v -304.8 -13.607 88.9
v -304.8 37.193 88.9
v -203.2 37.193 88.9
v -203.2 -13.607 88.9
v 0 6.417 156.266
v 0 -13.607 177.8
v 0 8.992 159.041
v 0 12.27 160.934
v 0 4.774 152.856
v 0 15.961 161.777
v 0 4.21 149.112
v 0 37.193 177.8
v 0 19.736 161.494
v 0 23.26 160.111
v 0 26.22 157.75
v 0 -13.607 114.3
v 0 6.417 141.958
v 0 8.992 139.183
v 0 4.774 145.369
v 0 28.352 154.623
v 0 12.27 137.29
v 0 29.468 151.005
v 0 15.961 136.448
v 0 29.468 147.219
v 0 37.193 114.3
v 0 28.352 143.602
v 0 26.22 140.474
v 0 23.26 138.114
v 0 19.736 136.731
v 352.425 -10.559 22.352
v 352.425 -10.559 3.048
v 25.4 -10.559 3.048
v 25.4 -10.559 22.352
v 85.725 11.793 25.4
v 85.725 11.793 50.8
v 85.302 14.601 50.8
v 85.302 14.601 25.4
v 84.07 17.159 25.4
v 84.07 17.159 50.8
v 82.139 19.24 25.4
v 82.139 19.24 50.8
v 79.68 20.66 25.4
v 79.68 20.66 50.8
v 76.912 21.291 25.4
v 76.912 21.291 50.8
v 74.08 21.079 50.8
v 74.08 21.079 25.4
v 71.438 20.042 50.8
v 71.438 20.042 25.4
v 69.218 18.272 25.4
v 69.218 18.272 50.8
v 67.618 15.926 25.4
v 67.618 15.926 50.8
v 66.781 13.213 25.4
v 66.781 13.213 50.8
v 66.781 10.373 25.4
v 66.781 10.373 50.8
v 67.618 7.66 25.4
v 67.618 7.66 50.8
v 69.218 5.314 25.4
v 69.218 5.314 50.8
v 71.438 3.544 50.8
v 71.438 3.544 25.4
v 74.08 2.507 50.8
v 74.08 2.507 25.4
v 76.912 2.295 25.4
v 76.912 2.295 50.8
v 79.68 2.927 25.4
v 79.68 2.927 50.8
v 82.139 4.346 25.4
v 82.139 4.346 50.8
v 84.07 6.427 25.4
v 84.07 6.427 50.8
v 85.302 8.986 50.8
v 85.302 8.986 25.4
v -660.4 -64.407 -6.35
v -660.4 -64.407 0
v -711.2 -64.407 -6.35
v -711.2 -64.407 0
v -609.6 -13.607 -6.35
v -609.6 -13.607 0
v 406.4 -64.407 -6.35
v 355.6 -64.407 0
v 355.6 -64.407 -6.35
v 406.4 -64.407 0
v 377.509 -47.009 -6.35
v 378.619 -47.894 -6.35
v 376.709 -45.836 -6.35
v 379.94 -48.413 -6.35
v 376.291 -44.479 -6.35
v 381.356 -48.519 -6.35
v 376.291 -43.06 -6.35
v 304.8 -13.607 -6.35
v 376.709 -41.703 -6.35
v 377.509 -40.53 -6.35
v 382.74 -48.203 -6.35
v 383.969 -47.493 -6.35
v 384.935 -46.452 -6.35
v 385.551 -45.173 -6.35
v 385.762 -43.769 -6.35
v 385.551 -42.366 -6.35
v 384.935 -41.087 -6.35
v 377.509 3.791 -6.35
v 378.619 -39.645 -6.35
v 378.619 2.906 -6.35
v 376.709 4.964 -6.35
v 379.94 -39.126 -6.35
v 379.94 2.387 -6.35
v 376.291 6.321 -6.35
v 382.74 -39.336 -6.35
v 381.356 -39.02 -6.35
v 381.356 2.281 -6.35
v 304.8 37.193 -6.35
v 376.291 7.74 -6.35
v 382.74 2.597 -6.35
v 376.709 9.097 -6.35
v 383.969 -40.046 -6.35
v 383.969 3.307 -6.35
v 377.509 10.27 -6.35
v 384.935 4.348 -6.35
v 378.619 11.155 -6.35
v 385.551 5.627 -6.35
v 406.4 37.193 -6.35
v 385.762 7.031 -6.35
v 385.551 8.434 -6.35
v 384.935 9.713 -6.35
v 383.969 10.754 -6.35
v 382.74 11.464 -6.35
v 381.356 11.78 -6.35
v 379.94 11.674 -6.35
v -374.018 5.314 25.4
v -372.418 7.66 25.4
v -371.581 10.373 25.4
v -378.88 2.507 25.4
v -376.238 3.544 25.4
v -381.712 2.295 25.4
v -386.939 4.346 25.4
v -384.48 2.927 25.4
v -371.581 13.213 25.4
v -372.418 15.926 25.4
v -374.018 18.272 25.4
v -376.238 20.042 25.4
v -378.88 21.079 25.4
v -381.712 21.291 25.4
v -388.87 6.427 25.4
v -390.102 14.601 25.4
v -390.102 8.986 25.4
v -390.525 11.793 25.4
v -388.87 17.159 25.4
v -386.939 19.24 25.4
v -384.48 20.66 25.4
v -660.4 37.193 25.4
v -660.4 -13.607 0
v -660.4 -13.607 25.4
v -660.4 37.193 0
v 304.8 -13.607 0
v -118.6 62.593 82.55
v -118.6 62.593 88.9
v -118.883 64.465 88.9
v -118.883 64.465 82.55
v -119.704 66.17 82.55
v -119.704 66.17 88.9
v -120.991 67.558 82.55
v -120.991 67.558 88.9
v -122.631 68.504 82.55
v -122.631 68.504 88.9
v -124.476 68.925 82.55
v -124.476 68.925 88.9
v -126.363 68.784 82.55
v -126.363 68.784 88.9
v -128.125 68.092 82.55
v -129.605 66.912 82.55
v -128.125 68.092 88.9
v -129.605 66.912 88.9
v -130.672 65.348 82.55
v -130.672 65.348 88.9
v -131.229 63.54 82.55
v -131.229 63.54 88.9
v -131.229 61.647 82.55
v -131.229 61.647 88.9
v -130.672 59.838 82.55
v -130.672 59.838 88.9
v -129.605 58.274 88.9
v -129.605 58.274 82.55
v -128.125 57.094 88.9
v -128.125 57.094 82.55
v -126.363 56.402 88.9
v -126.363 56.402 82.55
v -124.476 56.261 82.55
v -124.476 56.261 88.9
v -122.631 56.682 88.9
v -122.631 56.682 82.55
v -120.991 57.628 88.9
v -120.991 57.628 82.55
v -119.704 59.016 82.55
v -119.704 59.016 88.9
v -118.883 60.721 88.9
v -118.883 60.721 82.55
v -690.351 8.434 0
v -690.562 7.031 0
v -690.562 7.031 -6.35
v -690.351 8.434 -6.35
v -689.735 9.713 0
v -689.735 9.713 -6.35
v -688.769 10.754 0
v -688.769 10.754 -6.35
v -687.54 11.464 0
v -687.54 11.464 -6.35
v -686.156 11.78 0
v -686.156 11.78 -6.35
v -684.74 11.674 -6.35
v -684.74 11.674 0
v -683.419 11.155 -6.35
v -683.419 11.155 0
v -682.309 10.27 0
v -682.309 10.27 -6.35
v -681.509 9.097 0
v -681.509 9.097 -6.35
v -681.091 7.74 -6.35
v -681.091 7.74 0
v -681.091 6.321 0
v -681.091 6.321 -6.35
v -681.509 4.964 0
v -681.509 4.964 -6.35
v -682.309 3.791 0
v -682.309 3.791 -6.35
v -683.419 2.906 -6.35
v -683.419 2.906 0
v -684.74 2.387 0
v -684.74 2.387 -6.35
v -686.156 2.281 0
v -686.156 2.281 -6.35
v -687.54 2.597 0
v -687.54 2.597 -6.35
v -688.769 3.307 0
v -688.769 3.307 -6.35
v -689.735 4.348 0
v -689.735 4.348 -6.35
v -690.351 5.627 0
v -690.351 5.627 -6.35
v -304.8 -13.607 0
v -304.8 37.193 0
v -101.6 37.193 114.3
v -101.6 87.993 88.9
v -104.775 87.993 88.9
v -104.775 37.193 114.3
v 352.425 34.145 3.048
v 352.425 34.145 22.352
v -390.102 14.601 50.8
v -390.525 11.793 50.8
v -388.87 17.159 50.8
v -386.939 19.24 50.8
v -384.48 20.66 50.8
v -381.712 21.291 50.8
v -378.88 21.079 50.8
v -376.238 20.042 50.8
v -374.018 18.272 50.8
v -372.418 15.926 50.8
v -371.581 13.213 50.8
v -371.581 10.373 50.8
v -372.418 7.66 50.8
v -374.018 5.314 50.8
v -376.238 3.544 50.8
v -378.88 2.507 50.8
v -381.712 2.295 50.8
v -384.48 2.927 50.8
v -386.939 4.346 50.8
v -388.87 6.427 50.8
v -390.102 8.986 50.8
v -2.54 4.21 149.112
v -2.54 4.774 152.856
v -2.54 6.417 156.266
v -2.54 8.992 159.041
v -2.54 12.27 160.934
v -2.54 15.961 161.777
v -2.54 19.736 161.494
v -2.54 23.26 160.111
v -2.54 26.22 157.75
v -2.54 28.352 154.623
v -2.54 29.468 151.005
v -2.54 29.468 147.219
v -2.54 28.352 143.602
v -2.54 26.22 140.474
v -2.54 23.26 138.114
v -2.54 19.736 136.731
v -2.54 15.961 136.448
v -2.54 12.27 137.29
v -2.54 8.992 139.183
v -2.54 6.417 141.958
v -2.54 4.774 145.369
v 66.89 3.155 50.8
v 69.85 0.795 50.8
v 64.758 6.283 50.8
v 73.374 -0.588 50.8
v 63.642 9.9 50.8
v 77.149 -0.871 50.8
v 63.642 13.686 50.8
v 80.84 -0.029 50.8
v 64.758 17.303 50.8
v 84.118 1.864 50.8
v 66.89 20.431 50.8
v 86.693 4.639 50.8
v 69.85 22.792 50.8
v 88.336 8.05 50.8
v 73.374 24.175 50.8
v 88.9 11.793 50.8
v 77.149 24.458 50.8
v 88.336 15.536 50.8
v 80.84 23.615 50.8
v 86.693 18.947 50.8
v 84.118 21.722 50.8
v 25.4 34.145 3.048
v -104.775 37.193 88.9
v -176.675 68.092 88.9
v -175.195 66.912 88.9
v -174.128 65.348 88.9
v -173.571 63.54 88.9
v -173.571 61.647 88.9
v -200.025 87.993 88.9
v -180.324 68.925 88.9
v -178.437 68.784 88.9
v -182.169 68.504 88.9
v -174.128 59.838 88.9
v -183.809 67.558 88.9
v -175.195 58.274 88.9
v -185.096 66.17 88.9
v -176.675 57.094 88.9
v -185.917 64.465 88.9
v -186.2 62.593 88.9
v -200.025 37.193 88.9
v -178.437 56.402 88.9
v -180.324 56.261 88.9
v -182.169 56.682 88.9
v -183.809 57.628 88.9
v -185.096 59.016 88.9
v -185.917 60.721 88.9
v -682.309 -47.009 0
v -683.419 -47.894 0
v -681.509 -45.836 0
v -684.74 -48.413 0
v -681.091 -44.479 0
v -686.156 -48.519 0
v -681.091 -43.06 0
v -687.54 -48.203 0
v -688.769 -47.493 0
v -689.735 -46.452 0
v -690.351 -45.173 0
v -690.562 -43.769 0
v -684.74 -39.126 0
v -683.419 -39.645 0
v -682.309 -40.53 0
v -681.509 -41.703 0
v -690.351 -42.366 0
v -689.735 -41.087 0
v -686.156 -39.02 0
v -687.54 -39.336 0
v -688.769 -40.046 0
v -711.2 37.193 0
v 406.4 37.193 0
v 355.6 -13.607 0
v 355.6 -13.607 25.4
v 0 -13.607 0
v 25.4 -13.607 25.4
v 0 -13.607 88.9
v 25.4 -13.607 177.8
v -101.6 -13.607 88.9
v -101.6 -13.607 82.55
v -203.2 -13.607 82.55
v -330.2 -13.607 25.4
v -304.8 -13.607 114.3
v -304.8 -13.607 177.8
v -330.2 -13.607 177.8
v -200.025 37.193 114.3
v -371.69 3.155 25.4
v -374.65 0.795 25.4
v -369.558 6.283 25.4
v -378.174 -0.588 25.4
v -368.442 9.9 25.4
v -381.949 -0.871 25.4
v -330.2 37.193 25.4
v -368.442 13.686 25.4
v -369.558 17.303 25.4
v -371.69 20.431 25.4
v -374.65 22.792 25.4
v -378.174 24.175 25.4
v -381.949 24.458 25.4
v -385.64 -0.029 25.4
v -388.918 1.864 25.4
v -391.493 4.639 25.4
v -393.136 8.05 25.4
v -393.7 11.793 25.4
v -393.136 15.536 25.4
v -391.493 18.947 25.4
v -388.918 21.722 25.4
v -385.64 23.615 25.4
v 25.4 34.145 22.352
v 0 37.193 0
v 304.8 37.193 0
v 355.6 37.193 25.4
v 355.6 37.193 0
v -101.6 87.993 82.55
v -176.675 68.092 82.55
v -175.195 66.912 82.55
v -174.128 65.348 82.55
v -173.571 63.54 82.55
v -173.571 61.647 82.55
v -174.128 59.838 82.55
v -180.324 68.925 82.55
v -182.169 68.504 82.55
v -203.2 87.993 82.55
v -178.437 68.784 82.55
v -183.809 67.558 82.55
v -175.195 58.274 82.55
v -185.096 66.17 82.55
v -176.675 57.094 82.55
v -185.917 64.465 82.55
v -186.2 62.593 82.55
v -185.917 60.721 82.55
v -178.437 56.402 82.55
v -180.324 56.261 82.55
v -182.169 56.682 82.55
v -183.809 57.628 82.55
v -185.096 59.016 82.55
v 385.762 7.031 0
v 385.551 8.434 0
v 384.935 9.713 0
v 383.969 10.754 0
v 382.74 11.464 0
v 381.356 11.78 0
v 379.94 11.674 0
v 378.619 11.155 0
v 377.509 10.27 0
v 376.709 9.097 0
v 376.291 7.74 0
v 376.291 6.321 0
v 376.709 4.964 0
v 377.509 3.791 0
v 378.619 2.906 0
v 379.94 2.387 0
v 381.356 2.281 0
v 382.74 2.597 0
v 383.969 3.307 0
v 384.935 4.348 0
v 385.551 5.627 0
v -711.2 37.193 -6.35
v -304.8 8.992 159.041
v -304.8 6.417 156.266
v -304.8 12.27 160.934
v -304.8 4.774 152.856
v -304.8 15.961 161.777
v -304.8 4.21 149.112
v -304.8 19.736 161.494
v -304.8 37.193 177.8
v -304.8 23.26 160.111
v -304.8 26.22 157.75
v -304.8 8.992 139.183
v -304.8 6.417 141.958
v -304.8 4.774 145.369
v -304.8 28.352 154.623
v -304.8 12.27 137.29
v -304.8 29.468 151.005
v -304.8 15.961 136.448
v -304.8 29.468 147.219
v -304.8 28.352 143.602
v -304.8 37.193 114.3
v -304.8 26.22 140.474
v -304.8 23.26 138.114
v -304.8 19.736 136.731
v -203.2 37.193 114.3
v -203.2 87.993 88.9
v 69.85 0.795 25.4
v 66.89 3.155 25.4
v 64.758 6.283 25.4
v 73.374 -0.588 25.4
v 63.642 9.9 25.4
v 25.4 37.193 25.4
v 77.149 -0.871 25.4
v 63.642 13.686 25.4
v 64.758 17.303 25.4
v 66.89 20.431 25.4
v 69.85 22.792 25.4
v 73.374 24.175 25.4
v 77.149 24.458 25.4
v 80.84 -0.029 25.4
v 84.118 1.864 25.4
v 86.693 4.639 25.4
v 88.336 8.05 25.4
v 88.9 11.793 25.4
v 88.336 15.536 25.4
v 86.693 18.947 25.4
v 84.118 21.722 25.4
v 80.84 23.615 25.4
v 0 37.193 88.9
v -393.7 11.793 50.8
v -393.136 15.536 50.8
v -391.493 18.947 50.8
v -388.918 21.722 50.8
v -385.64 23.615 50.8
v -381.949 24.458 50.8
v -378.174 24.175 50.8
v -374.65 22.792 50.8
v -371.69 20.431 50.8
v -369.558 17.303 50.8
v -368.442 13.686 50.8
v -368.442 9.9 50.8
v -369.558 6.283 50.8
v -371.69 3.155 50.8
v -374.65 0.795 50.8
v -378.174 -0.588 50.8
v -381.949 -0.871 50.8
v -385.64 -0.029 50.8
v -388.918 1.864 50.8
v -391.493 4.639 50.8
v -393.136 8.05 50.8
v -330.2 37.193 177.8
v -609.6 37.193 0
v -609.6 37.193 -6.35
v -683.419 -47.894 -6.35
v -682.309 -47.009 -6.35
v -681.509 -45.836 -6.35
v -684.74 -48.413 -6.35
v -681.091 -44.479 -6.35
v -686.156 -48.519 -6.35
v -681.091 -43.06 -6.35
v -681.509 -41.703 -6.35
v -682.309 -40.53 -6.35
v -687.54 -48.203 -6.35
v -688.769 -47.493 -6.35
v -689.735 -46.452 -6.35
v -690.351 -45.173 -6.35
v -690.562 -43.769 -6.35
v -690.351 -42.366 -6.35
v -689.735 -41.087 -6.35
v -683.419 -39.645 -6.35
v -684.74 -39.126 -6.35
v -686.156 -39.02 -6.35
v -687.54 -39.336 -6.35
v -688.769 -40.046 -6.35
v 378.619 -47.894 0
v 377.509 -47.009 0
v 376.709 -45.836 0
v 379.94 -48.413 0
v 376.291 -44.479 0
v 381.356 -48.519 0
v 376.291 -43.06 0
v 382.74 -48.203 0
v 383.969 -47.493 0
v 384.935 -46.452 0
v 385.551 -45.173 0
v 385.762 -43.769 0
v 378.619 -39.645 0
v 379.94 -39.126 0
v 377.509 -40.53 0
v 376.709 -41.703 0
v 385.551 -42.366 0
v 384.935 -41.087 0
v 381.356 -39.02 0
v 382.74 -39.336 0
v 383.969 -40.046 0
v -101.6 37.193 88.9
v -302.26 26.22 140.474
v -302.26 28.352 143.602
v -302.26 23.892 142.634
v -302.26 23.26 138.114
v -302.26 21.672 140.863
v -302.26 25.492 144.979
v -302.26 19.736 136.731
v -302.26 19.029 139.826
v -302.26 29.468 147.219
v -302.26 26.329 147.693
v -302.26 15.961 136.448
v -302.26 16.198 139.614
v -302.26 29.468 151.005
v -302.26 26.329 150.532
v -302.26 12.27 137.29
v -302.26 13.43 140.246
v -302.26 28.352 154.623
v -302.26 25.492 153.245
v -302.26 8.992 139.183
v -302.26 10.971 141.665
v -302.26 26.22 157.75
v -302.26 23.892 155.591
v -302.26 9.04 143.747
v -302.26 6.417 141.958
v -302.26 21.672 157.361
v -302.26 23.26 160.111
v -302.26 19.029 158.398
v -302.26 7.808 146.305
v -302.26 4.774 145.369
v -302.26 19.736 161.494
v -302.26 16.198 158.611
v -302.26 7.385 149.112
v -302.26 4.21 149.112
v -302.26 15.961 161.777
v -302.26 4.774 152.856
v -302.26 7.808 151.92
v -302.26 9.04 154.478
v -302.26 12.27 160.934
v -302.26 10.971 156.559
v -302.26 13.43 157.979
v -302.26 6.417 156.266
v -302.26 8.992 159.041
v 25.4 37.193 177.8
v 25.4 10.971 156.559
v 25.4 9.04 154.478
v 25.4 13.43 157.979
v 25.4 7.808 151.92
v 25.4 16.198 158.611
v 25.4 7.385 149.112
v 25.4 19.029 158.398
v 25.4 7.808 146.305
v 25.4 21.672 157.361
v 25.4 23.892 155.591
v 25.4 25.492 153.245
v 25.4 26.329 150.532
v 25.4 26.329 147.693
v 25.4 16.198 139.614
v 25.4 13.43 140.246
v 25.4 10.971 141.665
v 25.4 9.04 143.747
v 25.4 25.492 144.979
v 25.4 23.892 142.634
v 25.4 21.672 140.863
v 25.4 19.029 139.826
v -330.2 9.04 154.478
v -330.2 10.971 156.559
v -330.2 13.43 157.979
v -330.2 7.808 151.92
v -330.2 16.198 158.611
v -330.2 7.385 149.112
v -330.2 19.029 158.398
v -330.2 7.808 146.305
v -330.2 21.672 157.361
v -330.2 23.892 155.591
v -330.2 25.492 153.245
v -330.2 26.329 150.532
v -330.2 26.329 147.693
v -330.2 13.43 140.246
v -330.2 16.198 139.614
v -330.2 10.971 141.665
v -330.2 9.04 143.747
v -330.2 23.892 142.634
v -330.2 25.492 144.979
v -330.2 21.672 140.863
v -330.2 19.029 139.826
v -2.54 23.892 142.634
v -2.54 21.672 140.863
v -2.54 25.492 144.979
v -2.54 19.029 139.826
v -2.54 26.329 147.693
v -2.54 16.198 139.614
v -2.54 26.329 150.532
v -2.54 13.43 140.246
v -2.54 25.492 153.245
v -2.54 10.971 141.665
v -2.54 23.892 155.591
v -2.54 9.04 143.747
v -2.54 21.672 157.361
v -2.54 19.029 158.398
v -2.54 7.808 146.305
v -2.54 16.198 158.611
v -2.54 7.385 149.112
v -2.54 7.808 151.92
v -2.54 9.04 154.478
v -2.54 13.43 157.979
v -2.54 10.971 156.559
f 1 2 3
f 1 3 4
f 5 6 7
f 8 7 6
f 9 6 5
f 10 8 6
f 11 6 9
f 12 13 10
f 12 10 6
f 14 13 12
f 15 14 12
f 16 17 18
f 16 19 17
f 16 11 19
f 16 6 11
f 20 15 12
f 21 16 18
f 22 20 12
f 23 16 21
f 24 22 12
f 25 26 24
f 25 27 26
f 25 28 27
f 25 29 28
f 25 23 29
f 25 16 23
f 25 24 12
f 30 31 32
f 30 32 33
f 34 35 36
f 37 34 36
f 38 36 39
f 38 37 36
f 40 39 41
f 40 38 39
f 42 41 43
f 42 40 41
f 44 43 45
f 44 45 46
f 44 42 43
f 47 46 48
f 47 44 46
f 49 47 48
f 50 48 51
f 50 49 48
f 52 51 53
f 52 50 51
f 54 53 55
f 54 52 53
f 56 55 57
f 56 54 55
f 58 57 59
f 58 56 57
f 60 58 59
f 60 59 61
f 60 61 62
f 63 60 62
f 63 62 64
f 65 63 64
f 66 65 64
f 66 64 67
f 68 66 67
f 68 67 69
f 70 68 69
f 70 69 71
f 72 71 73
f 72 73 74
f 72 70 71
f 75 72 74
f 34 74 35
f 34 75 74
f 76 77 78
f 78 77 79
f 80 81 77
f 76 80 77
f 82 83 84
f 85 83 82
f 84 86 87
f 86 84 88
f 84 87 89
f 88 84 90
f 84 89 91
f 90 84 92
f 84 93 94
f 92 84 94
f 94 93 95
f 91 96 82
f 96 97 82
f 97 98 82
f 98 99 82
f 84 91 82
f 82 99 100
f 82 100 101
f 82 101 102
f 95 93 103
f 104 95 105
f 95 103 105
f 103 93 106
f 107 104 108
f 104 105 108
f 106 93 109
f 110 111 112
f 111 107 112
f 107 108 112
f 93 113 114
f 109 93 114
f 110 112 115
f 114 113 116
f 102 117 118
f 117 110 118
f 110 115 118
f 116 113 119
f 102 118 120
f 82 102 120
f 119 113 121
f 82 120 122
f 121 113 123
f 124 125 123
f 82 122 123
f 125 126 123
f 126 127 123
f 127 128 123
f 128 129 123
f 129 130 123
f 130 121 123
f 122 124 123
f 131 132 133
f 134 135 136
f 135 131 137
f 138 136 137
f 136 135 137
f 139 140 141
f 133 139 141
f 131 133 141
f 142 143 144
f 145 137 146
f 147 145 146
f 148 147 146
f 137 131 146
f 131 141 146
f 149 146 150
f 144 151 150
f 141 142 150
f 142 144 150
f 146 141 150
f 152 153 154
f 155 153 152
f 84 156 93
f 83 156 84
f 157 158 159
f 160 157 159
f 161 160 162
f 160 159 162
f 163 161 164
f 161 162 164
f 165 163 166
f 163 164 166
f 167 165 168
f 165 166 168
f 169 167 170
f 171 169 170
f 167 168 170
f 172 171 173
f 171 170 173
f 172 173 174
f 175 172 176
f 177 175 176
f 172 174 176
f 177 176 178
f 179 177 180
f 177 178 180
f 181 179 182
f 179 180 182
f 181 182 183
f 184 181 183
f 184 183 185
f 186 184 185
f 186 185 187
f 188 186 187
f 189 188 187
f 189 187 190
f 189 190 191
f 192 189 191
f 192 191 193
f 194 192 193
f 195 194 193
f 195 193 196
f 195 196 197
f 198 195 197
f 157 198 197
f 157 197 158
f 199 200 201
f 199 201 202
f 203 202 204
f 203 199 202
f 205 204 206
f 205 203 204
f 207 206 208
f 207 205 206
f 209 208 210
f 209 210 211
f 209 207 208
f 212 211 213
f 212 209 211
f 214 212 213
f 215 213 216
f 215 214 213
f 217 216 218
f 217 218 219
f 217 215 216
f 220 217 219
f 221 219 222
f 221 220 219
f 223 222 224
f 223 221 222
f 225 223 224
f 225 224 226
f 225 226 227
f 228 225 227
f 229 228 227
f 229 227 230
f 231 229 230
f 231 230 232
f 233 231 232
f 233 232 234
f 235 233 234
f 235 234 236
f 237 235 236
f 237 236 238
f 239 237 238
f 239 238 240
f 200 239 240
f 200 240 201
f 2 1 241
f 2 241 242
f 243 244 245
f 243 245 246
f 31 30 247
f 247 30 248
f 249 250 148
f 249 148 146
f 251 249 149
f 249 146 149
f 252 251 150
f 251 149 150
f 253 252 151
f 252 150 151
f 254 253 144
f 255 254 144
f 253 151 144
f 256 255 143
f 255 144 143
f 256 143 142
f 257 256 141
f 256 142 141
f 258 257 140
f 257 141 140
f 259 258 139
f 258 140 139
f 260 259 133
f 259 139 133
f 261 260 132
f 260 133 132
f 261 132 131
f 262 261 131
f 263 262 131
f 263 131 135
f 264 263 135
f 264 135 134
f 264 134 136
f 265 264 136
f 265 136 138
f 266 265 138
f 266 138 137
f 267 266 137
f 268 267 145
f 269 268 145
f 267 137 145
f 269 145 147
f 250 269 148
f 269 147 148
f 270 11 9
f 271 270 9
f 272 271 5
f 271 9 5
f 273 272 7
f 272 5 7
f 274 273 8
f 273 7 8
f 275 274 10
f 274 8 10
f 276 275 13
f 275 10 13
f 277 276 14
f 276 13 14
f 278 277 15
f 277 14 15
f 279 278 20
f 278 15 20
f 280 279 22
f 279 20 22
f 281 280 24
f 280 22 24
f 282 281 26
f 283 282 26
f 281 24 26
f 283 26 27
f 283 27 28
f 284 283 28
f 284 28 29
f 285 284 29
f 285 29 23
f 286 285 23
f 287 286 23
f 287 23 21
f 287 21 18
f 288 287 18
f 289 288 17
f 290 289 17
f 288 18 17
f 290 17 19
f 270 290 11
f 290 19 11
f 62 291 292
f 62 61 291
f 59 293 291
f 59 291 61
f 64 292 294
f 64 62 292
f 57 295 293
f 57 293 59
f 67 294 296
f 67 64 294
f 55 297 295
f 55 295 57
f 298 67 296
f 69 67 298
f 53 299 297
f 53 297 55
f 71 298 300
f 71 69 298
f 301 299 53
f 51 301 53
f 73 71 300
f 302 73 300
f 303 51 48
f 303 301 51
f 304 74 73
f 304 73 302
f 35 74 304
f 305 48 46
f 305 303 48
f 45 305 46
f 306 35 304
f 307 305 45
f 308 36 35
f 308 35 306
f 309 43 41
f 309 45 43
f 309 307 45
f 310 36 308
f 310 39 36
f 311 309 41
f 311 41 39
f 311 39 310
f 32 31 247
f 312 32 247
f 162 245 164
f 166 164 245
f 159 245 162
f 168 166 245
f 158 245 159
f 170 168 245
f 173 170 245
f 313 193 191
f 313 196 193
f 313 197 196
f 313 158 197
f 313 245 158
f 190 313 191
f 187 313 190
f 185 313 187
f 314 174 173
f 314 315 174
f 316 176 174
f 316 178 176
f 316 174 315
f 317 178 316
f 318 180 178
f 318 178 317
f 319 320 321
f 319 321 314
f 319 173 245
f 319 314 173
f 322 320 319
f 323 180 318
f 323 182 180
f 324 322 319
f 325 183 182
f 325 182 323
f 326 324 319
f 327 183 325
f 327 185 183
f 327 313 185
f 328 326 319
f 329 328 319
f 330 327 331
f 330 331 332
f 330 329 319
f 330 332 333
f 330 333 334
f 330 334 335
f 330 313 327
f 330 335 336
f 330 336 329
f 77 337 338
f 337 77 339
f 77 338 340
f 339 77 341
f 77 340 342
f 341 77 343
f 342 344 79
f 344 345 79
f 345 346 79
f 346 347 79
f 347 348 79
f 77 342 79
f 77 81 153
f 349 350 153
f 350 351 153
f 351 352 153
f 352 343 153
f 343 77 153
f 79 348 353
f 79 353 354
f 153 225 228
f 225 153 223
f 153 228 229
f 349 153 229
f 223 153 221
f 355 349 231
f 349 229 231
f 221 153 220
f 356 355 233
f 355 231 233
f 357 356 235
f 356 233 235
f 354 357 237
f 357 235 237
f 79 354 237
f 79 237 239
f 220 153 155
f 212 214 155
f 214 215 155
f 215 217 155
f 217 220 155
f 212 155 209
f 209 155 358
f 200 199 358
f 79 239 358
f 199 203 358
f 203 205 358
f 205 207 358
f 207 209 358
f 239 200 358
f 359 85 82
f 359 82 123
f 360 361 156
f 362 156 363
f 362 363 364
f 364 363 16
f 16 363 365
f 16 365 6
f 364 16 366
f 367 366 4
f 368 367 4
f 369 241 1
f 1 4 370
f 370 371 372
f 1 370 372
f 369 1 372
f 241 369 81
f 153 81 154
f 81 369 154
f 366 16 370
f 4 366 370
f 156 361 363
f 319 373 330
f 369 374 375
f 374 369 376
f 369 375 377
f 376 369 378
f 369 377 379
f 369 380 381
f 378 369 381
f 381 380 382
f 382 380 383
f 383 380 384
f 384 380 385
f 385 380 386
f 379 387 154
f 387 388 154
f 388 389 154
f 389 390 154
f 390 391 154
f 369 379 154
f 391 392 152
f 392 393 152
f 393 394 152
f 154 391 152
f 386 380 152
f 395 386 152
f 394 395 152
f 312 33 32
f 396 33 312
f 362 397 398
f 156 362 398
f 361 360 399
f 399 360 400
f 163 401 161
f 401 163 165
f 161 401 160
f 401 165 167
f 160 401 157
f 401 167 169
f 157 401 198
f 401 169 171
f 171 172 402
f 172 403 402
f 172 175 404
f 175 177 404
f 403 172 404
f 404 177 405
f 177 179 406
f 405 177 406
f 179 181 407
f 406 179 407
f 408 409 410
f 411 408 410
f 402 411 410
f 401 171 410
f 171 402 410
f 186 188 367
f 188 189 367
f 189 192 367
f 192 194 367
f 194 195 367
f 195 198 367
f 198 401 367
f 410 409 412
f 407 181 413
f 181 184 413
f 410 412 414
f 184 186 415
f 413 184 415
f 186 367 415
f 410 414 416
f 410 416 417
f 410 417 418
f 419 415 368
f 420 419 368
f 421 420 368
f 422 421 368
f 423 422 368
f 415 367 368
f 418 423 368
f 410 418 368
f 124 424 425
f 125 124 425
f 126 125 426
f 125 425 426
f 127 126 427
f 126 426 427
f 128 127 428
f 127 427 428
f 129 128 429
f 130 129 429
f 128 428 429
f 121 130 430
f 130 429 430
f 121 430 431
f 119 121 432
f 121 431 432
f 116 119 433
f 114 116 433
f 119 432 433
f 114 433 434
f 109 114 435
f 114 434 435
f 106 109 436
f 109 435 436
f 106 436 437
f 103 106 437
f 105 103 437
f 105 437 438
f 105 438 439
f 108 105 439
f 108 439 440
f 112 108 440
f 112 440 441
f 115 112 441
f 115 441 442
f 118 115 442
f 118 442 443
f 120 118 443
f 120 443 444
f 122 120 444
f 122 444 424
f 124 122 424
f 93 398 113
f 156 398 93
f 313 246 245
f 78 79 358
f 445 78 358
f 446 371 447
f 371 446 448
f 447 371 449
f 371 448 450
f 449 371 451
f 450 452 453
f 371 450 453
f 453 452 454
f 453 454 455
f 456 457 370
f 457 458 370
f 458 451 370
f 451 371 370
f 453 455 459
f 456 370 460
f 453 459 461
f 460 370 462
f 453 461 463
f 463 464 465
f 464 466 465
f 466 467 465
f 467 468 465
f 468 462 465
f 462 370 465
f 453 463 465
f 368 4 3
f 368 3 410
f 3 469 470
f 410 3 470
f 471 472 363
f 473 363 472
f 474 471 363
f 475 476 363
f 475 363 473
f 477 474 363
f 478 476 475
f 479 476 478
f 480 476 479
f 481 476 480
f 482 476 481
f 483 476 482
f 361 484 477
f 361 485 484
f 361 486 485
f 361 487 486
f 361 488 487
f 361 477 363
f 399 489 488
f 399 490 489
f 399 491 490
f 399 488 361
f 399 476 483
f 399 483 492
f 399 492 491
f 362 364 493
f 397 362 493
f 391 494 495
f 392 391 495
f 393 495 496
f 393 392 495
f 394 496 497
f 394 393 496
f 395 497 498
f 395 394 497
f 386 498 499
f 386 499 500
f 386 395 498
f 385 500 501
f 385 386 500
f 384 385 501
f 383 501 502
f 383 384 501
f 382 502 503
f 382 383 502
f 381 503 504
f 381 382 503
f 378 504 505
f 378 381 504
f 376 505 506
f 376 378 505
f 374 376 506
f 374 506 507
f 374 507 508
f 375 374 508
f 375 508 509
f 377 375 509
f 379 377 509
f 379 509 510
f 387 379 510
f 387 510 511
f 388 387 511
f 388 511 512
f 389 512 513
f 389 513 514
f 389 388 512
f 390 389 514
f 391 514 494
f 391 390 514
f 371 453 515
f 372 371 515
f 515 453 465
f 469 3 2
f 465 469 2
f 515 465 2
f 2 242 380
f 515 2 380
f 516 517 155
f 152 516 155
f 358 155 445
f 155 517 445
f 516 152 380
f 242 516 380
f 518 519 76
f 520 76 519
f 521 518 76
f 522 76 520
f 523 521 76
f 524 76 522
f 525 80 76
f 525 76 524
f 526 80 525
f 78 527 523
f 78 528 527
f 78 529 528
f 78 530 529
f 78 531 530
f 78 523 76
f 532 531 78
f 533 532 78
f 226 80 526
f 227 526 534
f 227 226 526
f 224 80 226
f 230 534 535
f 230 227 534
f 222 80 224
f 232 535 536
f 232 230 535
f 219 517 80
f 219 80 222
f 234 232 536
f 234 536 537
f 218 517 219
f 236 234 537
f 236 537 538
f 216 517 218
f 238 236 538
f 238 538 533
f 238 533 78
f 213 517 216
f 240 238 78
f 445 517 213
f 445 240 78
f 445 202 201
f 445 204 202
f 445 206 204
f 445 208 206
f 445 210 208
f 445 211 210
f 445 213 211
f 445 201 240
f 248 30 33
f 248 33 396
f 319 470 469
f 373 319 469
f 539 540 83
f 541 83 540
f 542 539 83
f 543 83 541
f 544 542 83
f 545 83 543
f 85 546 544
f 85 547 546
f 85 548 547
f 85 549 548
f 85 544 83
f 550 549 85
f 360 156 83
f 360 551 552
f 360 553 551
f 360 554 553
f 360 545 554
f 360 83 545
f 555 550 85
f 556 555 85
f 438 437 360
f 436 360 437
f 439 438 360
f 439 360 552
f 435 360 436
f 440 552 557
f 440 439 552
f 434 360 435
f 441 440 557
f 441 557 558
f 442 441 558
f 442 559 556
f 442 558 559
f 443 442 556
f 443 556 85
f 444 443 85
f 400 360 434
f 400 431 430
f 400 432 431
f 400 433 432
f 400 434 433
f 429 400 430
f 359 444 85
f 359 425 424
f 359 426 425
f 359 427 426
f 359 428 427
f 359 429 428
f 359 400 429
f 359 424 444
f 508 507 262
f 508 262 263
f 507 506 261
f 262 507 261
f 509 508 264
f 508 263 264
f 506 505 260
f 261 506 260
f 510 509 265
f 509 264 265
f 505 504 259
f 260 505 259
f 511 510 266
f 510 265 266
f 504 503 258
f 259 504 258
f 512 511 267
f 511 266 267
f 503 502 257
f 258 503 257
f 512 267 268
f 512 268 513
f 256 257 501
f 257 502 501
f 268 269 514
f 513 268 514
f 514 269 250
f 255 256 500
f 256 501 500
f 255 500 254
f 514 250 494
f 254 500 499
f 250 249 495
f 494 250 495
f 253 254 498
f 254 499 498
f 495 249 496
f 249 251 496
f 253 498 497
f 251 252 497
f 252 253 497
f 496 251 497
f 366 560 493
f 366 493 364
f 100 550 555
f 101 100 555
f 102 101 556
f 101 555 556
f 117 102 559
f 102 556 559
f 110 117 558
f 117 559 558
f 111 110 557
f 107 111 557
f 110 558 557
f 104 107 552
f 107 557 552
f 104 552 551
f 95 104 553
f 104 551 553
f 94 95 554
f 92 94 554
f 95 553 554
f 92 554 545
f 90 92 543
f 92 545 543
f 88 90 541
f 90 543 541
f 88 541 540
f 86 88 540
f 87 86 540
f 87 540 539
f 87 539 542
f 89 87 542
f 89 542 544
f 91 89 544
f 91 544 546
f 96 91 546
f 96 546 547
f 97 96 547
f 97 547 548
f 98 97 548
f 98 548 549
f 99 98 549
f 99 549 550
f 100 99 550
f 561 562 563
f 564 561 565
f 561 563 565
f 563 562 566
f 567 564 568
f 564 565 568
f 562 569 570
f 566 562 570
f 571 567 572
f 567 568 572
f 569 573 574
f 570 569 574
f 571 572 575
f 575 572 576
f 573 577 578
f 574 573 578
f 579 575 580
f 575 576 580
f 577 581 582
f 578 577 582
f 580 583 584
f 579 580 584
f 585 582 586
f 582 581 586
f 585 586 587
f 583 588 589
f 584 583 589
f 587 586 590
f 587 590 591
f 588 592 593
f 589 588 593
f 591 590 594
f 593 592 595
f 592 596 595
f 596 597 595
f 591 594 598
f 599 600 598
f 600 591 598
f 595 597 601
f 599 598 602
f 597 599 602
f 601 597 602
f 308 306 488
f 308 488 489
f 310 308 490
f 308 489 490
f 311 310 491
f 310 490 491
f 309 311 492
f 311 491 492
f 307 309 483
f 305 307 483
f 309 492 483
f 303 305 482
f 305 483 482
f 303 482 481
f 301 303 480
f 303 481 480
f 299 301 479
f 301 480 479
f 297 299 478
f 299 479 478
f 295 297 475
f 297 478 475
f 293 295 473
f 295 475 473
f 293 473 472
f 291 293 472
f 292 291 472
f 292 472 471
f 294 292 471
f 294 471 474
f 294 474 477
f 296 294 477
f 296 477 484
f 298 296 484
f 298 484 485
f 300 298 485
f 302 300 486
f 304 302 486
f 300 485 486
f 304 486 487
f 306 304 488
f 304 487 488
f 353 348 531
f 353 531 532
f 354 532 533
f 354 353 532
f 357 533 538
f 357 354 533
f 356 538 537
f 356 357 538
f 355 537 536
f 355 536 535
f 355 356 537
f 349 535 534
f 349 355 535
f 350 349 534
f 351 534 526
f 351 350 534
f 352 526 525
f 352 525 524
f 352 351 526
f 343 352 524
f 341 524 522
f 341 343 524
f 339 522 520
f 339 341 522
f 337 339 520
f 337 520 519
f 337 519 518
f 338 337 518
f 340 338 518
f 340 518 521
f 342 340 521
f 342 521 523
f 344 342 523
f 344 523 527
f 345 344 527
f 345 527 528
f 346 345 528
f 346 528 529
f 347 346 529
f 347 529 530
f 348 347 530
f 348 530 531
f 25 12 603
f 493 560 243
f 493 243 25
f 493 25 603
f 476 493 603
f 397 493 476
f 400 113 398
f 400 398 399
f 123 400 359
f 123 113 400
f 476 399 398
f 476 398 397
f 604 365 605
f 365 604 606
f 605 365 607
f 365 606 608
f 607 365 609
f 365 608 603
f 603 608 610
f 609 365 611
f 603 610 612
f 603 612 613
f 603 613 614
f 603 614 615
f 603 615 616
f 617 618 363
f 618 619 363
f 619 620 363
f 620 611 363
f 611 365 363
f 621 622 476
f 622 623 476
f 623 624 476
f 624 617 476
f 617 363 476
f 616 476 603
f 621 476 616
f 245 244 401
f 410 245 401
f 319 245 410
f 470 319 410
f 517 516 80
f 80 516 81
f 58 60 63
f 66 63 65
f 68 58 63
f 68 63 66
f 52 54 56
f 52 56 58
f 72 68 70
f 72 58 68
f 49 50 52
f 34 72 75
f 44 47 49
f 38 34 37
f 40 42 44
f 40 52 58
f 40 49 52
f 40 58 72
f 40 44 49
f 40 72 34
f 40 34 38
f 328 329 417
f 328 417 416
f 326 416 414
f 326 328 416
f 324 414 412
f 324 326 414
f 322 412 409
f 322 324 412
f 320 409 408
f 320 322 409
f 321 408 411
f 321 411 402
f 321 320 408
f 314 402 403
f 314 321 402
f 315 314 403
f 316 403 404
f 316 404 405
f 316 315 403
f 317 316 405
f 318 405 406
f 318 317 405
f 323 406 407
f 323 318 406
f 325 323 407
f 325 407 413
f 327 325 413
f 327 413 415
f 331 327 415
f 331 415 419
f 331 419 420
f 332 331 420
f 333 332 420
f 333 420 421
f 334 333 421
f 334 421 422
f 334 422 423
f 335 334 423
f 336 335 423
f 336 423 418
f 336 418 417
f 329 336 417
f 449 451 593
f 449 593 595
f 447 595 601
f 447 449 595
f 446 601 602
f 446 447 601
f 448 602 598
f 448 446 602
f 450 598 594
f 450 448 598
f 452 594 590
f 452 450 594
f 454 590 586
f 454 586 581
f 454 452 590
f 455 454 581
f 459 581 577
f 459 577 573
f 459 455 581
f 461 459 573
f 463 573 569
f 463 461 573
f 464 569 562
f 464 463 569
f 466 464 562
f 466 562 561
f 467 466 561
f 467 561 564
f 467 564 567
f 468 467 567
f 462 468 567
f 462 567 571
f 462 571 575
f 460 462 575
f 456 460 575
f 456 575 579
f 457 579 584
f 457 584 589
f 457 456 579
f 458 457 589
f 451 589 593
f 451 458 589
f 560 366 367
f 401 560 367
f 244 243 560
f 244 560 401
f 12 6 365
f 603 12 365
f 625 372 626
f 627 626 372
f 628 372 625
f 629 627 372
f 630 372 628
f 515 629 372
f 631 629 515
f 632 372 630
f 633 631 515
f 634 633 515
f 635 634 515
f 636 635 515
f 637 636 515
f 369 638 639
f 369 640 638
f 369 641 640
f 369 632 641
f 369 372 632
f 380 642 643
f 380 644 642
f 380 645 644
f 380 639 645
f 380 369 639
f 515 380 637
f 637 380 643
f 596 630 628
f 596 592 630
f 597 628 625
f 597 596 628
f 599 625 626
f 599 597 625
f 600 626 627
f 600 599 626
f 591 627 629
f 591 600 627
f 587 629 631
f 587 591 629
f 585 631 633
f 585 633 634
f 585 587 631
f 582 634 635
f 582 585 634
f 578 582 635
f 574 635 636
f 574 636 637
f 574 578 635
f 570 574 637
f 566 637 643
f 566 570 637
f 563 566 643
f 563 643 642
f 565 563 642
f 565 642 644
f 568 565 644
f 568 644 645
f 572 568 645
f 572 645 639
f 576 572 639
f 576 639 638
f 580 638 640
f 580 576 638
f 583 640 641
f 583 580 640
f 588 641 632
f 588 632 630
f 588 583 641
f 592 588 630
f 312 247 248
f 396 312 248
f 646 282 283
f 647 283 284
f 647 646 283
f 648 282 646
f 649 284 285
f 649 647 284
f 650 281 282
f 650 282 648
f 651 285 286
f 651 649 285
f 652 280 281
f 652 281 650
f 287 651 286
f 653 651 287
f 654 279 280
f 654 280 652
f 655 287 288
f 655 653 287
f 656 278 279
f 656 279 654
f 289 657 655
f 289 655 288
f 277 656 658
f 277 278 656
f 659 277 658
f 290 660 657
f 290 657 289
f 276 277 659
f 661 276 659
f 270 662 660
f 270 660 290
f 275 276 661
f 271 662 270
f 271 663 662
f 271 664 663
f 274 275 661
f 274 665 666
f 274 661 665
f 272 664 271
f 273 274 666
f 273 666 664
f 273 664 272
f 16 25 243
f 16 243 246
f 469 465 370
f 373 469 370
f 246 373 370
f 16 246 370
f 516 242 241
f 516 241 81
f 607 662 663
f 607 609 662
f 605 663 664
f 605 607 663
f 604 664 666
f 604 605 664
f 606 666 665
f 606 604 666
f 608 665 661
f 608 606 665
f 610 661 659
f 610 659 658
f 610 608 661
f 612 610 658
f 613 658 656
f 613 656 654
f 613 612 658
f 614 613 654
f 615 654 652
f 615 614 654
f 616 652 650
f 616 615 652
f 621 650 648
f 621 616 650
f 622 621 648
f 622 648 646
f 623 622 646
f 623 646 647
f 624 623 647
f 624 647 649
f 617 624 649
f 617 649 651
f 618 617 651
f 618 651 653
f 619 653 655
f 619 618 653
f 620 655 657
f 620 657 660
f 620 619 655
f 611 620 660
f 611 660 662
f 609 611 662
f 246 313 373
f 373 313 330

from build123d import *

# Parameters (mm, degrees)
F0_W      = 355.6
F0_H      = 50.8
F1_DEPTH  = 25.4
F3_DEPTH  = 6.35
F4_R      = 4.7625
F5_DEPTH  = 25.4
F6_R      = 12.7
F6_R_2    = 9.525
F7_DEPTH  = 25.4
F8_W      = 25.4
F8_H      = 50.8
F9_DEPTH  = 152.4
F10_W     = 50.8
F10_H     = 25.4
F11_DEPTH = 152.4
F12_R     = 12.7
F12_R_2   = 9.525
F13_DEPTH = 2.54
F14_R     = 9.525
F15_DEPTH = 25.4
F16_W     = 50.8
F16_H     = 101.6
F17_DEPTH = 6.35
F18_R     = 6.35
F19_DEPTH = 25.4
F20_W     = 50.8
F20_H     = 6.35
F21_DEPTH = 3.175
F24_W     = 44.704
F24_H     = 19.304
F25_DEPTH = 327.025


with BuildPart() as f1:
    # F0 (on Top) → F1 (new body)
    with BuildSketch(Plane.XY):
        with Locations((177.8, 11.7930904027)):
            Rectangle(F0_W, F0_H)
    extrude(amount=F1_DEPTH)

    # F2 (on Top) → F3 (join)
    with BuildSketch(Plane.XY):
        Polygon((355.6, 37.1930904027), (304.8, 37.1930904027), (304.8, -13.6069095973), (355.6, -64.4069095973), (406.4, -64.4069095973), (406.4, 37.1930904027), align=None)
    extrude(amount=-F3_DEPTH)

    # F4 (on face) → F5 (cut)
    with BuildSketch(Plane.XY):
        with Locations((381, -43.7694095973)):
            Circle(F4_R)
        with Locations((381, 7.0305904027)):
            Circle(F4_R)
    extrude(amount=-F5_DEPTH, mode=Mode.SUBTRACT)

    # F6 (on face) → F7 (join)
    with BuildSketch(Plane.XY.offset(25.4)):
        with Locations((76.2, 11.7930904027)):
            Circle(F6_R)
        with Locations((76.2, 11.7930904027)):
            Circle(F6_R_2, mode=Mode.SUBTRACT)
    extrude(amount=F7_DEPTH)

    # F8 (on face) → F9 (join)
    with BuildSketch(Plane.XY.offset(25.4)):
        with Locations((12.7, 11.7930904027)):
            Rectangle(F8_W, F8_H)
    extrude(amount=F9_DEPTH)

    # F10 (on face) → F11 (join)
    with BuildSketch(Plane(origin=(0, 0, 0), x_dir=(0, -1, 0), z_dir=(-1, 0, 0))):
        with Locations((-11.7930904027, 101.6)):
            Rectangle(F10_W, F10_H)
    extrude(amount=F11_DEPTH)

    # F12 (on face) → F13 (join)
    with BuildSketch(Plane(origin=(0, 0, 0), x_dir=(0, -1, 0), z_dir=(-1, 0, 0))):
        with Locations((-16.9099774212, 149.1121947765)):
            Circle(F12_R)
        with Locations((-16.9099774212, 149.1121947765)):
            Circle(F12_R_2, mode=Mode.SUBTRACT)
    extrude(amount=F13_DEPTH)

    # F14 (on face) → F15 (cut)
    with BuildSketch(Plane(origin=(0, 0, 0), x_dir=(0, -1, 0), z_dir=(-1, 0, 0))):
        with Locations((-16.9099774212, 149.1121947765)):
            Circle(F14_R)
    extrude(amount=-F15_DEPTH, mode=Mode.SUBTRACT)

    # F16 (on face) → F17 (join)
    with BuildSketch(Plane(origin=(0, 0, 88.9), x_dir=(1, 0, 0), z_dir=(0, 0, -1))):
        with Locations((-127, -37.1930904027)):
            Rectangle(F16_W, F16_H)
    extrude(amount=F17_DEPTH)

    # F18 (on face) → F19 (cut)
    with BuildSketch(Plane.XY.offset(88.9)):
        with Locations((-124.9504238367, 62.5930904027)):
            Circle(F18_R)
    extrude(amount=-F19_DEPTH, mode=Mode.SUBTRACT)

    # F20 (on face) → F21 (join)
    with BuildSketch(Plane.YZ.offset(-101.6)):
        Polygon((37.1930904027, 88.9), (87.9930904027, 88.9), (37.1930904027, 114.3), align=None)
        with Locations((62.5930904027, 85.725)):
            Rectangle(F20_W, F20_H)
    extrude(amount=-F21_DEPTH)

    # F22: F1 across face


with BuildPart() as f1_1:
    add(f1.part)
    add(f1.part.mirror(Plane(origin=(-152.4, 20.2597570693, 96.3083333333), x_dir=(0, -1, 0), z_dir=(-1, 0, 0))))

    # F24 (on offset) → F25 (cut, through all)
    with BuildSketch(Plane.YZ.offset(352.425)):
        with Locations((11.7930904027, 12.7)):
            Rectangle(F24_W, F24_H)
    extrude(amount=-F25_DEPTH, mode=Mode.SUBTRACT)


solid = f1_1.part
